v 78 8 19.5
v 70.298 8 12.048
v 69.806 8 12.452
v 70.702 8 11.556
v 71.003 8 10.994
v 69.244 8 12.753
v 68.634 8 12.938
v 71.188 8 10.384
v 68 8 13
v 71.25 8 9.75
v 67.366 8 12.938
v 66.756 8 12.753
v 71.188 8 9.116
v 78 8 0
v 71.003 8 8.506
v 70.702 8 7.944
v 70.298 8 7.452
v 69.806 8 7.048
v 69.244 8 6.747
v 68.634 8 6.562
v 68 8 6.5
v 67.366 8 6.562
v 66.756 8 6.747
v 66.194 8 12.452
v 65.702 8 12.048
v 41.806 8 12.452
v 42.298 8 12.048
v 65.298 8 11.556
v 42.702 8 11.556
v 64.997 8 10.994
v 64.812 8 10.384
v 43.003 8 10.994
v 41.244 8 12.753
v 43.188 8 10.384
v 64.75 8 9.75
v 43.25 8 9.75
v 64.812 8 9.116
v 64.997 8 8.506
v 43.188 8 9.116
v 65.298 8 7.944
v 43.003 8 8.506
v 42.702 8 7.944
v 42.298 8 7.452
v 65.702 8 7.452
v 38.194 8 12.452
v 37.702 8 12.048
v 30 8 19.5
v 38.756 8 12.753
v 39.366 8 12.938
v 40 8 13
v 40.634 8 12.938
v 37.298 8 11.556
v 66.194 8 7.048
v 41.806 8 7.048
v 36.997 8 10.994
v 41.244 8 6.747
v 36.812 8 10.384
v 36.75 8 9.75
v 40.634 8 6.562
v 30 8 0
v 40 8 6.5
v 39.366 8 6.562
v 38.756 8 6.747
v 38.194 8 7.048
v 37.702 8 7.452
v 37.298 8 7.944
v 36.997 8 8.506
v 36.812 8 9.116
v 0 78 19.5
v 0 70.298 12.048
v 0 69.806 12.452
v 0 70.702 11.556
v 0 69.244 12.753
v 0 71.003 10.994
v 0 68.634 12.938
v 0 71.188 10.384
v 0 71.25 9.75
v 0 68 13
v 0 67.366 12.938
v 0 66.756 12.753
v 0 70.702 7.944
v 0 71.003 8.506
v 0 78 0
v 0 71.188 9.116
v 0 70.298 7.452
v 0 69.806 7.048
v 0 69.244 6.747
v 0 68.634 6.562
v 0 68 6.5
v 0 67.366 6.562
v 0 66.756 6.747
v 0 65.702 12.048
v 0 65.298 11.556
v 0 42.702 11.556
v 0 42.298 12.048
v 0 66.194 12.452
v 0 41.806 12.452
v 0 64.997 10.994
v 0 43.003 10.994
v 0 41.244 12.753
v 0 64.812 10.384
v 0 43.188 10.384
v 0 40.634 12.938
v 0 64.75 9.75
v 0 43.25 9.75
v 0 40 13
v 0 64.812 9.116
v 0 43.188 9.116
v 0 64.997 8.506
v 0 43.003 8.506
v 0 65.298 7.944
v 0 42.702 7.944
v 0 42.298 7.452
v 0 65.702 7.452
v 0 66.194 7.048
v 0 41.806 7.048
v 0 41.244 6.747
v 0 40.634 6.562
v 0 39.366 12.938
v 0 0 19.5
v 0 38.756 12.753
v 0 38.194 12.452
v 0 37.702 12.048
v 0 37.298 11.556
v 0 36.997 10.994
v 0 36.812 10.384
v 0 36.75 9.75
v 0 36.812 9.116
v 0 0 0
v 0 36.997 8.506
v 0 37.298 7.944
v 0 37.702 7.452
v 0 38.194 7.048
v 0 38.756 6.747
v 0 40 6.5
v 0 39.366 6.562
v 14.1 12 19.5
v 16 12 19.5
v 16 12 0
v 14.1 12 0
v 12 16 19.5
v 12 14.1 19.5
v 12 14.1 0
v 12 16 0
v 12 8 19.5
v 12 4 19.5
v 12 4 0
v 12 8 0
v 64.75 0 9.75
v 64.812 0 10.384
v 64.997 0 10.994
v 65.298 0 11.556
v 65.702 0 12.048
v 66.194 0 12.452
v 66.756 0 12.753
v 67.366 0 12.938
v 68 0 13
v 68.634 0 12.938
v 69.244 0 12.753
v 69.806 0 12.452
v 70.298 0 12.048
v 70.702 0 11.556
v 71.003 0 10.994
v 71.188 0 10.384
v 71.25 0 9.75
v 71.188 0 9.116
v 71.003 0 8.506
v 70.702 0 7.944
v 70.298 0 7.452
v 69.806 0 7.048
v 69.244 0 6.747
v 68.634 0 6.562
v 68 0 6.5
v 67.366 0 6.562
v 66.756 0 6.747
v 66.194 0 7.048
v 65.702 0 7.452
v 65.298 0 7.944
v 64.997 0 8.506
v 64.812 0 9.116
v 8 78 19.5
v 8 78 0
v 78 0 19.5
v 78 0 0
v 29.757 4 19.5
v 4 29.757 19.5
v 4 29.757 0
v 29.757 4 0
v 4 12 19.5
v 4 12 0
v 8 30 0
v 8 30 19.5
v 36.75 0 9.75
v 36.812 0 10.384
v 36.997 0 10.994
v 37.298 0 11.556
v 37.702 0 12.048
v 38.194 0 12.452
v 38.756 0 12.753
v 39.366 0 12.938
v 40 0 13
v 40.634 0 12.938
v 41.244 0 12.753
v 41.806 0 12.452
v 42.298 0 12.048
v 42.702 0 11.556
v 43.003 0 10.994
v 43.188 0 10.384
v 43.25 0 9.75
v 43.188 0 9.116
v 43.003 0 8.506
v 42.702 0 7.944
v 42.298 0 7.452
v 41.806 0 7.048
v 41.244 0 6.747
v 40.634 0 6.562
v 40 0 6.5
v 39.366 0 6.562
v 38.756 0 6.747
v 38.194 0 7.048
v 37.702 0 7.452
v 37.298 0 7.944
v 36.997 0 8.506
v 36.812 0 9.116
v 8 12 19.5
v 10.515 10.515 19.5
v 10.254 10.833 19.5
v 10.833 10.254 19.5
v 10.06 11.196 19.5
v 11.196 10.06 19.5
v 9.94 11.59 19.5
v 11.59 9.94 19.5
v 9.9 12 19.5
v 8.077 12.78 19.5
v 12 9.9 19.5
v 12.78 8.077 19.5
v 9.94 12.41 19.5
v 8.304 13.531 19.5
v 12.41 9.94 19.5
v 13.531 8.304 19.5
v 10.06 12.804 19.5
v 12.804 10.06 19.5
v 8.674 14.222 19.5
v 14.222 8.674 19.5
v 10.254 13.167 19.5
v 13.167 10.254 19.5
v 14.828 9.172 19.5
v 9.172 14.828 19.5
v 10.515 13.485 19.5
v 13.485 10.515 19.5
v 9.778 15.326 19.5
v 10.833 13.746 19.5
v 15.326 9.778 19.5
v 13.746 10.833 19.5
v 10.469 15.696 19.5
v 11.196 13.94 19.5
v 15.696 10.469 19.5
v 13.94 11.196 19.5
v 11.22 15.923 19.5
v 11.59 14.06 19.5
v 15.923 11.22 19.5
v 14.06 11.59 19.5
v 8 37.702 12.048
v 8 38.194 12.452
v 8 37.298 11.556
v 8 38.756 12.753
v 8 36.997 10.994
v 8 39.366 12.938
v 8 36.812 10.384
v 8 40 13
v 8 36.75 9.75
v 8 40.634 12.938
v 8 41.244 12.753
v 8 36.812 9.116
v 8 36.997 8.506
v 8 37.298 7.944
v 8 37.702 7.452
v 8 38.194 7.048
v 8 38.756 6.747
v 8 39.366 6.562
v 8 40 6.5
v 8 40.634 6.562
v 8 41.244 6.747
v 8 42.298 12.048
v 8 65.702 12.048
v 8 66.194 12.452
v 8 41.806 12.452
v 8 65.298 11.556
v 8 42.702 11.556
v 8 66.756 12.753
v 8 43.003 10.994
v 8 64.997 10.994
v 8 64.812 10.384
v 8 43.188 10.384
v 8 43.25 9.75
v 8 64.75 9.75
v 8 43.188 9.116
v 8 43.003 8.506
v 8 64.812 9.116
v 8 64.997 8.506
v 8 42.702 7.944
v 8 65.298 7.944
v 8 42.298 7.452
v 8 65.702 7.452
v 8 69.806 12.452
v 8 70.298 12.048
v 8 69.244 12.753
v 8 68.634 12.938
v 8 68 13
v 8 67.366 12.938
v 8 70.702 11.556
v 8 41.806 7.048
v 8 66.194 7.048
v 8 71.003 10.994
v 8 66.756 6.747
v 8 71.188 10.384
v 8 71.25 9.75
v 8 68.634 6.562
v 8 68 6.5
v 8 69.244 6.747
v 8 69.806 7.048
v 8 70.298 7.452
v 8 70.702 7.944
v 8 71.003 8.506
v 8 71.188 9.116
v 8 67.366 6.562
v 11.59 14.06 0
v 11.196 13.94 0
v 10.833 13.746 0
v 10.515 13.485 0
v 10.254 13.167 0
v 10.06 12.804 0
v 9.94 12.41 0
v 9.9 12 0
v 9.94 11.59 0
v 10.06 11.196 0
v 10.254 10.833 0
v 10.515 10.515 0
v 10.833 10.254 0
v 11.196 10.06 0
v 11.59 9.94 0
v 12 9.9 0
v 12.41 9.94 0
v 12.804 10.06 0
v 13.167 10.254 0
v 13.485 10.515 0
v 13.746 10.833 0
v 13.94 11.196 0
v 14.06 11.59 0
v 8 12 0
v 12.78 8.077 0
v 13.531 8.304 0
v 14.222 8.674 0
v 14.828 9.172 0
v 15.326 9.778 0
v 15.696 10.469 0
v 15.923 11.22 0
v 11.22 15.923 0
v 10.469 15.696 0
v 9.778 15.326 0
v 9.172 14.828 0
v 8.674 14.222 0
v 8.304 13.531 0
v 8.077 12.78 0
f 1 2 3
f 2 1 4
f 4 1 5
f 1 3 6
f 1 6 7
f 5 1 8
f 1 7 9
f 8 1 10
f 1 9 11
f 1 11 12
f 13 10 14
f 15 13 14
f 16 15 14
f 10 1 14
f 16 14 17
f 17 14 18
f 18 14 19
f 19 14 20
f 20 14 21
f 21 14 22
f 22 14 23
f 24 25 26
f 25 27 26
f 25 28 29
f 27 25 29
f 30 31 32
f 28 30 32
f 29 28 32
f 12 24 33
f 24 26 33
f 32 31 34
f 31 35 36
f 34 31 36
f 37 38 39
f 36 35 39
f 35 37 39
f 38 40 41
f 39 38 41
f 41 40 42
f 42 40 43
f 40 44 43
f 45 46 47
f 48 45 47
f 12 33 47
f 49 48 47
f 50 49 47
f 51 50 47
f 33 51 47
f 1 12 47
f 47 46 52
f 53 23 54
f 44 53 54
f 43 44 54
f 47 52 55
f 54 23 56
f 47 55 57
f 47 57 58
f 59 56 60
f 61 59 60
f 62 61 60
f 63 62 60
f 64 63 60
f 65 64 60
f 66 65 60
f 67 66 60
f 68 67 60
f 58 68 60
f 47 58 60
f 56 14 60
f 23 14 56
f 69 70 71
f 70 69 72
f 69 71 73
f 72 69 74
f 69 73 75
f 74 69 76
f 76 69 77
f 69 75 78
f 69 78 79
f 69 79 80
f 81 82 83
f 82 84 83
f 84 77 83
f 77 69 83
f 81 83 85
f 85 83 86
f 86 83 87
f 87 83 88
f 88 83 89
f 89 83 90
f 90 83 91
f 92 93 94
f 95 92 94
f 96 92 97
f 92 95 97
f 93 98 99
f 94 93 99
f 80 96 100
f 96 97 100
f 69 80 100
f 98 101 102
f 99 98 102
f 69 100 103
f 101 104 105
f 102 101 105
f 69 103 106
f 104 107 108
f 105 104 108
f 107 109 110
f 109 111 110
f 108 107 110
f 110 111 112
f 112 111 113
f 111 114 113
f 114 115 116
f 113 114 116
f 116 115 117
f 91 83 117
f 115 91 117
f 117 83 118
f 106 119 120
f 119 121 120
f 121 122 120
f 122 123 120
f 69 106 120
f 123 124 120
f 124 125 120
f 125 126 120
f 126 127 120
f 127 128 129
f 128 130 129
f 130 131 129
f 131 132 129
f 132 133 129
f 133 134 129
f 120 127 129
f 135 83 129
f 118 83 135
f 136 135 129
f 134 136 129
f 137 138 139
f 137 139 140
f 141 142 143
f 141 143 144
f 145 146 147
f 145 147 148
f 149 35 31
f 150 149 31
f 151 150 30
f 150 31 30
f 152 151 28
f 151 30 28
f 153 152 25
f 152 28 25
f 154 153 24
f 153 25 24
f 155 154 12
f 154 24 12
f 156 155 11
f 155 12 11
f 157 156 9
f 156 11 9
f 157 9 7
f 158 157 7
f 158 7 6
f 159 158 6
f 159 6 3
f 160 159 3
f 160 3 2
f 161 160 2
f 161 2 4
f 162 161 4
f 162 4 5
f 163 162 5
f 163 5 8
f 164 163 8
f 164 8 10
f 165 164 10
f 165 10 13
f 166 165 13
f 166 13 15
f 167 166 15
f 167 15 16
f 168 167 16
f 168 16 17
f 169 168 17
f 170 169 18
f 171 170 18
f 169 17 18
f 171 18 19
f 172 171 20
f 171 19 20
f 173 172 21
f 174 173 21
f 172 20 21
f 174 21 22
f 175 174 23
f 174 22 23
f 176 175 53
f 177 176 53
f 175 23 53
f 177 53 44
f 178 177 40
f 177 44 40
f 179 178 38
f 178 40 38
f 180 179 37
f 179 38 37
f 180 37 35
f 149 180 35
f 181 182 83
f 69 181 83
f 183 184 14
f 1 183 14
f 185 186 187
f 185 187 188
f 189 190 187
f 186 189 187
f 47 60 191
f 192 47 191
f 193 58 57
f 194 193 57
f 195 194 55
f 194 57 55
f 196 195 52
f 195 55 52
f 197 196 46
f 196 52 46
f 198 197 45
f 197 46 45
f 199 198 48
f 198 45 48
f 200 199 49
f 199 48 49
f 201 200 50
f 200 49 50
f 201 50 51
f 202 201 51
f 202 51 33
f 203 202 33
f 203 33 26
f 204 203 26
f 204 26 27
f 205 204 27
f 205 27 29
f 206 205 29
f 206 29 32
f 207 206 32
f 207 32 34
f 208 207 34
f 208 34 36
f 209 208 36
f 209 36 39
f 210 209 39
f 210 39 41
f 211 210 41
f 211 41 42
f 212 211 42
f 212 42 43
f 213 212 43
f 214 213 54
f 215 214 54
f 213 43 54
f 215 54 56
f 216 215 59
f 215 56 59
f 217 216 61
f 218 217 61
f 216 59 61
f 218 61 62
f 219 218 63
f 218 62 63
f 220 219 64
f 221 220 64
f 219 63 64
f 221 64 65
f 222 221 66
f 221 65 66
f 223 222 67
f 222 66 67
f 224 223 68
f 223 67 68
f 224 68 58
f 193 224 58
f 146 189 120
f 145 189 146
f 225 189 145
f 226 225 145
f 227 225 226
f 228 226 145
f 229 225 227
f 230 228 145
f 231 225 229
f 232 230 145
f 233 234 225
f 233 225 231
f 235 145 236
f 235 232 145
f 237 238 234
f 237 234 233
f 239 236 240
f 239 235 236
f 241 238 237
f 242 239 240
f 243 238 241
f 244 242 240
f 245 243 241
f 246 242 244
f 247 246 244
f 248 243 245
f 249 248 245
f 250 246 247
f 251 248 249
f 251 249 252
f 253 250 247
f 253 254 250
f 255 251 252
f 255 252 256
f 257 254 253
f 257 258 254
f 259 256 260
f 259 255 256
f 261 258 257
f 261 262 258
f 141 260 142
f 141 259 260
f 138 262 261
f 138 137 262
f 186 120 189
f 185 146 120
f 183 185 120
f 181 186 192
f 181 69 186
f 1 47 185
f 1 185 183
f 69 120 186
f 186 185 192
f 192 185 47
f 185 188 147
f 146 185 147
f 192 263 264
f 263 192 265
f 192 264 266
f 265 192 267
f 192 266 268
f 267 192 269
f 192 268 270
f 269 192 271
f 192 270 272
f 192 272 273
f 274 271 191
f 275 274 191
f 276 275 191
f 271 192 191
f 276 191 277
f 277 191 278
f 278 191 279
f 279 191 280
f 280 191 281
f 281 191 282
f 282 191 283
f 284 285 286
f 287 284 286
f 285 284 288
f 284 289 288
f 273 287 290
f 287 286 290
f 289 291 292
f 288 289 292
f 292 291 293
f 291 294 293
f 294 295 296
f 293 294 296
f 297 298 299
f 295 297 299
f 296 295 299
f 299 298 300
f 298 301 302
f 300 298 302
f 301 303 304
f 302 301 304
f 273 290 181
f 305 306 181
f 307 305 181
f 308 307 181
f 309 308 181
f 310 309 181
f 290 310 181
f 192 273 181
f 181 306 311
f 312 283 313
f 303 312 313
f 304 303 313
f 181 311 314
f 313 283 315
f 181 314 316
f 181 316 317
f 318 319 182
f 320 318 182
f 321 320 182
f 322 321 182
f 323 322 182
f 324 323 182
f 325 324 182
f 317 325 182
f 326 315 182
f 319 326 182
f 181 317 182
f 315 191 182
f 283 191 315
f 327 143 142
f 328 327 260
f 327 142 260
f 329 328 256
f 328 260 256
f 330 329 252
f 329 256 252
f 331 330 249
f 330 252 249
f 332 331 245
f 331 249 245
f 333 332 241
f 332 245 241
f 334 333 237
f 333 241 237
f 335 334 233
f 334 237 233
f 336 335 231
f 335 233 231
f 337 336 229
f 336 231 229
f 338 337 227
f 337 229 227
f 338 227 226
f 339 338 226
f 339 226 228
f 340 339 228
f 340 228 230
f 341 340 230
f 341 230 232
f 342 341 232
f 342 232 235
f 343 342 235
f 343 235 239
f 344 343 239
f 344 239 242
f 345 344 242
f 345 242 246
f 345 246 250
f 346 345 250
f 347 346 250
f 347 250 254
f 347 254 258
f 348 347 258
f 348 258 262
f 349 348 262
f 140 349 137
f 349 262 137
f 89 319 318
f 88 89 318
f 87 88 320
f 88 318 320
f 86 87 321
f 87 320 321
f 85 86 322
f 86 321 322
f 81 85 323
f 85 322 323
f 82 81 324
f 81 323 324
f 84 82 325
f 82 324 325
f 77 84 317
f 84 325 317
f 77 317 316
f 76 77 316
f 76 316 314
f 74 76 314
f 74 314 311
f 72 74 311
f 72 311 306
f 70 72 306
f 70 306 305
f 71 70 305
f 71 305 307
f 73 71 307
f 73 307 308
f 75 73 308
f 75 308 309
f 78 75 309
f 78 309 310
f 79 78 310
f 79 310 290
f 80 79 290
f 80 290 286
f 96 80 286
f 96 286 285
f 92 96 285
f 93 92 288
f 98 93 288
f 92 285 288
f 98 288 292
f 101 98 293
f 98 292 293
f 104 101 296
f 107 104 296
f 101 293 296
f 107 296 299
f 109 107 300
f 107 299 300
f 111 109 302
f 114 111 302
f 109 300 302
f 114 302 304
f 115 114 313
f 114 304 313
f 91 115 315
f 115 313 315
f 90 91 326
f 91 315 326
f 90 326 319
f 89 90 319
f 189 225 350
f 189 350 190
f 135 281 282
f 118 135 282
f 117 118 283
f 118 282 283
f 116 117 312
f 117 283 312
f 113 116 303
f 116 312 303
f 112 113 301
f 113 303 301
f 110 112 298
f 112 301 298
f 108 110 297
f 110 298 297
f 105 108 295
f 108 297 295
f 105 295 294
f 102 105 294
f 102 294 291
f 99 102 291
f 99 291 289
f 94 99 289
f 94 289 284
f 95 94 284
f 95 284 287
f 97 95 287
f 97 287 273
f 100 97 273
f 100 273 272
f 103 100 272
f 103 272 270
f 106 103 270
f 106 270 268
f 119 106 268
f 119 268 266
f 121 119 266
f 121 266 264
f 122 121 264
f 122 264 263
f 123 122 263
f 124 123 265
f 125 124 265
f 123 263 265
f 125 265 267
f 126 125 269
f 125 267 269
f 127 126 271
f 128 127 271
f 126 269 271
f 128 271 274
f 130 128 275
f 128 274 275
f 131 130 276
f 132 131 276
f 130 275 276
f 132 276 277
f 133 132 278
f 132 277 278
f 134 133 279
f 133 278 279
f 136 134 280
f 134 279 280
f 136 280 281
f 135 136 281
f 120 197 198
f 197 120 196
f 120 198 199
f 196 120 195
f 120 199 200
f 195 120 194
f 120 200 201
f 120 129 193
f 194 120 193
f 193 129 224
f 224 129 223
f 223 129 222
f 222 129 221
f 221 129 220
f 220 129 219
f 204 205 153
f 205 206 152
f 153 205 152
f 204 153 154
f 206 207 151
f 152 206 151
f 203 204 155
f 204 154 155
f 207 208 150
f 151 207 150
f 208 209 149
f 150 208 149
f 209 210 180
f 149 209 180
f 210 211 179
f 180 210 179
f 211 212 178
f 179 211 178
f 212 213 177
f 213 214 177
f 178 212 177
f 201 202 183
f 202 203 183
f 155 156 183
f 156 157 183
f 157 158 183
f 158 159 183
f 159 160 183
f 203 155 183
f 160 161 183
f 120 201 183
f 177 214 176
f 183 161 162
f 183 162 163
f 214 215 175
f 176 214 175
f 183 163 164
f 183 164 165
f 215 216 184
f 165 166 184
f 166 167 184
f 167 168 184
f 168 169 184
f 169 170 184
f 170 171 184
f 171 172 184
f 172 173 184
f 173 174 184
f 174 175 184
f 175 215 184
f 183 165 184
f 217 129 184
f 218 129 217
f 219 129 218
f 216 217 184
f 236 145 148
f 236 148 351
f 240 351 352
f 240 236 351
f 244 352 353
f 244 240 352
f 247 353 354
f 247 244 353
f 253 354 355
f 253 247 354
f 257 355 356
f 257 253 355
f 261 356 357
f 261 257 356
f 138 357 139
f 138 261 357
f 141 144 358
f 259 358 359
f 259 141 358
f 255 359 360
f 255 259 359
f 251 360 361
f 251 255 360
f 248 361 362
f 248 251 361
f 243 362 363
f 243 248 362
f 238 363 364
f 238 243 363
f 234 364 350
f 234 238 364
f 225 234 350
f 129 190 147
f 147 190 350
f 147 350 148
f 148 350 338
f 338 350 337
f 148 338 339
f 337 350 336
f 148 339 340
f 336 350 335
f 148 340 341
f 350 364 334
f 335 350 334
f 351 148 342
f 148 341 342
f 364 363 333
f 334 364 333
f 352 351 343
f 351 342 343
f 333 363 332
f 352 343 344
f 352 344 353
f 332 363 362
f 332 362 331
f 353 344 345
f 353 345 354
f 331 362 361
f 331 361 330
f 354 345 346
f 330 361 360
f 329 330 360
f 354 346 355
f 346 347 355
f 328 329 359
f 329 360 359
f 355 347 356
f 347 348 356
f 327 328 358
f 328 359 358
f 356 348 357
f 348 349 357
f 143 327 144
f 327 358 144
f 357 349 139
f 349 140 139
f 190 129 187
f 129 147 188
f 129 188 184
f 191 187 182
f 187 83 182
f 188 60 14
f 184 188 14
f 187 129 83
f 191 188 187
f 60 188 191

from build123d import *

# Parameters (mm, degrees)
EXTRUDE_1_DEPTH     = 19.5
CUT_EXTRUDE_1_REACH = 114.019
EXTRUDE_2_DEPTH     = 19.5
CUT_EXTRUDE_2_REACH = 114.019
SKETCH_4_R          = 2.1
CUT_EXTRUDE_3_REACH = 108.603
SKETCH_5_R          = 3.25
CUT_EXTRUDE_4_REACH = 108.603
SKETCH_6_R          = 3.25


with BuildPart() as part:
    # 草图1 → 凸台-拉伸1 (new body)
    with BuildSketch(Plane.XY):
        Polygon((0, 0), (78, 0), (78, 8), (30, 8), (8, 30), (8, 78), (0, 78), align=None)
    extrude(amount=EXTRUDE_1_DEPTH)

    # 草图2 → 切除-拉伸1 (cut, up to next)
    with BuildSketch(Plane.XY.offset(19.5), mode=Mode.PRIVATE) as cut_extrude_1_sk1:
        Polygon((4, 29.757359313), (29.757359313, 4), (12, 4), (12, 12), (4, 12), align=None)
    cut_extrude_1_tool1 = extrude(cut_extrude_1_sk1.sketch, amount=-CUT_EXTRUDE_1_REACH, mode=Mode.PRIVATE) & part.part
    add(cut_extrude_1_tool1.solids().sort_by_distance((13.682042, 13.682042, 19.5))[0], mode=Mode.SUBTRACT)

    # 草图3 → 凸台-拉伸2 (add)
    with BuildSketch(Plane.XY.offset(19.5)):
        with BuildLine():
            Line((12, 12), (12, 16))
            ThreePointArc((12, 16), (9.171572875, 9.171572875), (16, 12))
            Line((16, 12), (12, 12))
        make_face()
    extrude(amount=-EXTRUDE_2_DEPTH)

    # 草图4 → 切除-拉伸2 (cut, up to next)
    with BuildSketch(Plane.XY.offset(19.5), mode=Mode.PRIVATE) as cut_extrude_2_sk1:
        with Locations((12, 12)):
            Circle(SKETCH_4_R)
    cut_extrude_2_tool1 = extrude(cut_extrude_2_sk1.sketch, amount=-CUT_EXTRUDE_2_REACH, mode=Mode.PRIVATE) & part.part
    add(cut_extrude_2_tool1.solids().sort_by_distance((12, 12, 19.5))[0], mode=Mode.SUBTRACT)

    # 草图5 → 切除-拉伸3 (cut, up to next)
    with BuildSketch(Plane(origin=(0, 8, 0), x_dir=(1, 0, 0), z_dir=(0, 1, 0)), mode=Mode.PRIVATE) as cut_extrude_3_sk1:
        with Locations(Location((40, -9.75, 0), (0, 0, 180))):
            Circle(SKETCH_5_R)
    cut_extrude_3_tool1 = extrude(cut_extrude_3_sk1.sketch, amount=-CUT_EXTRUDE_3_REACH, mode=Mode.PRIVATE) & part.part
    # 草图5 → 切除-拉伸3 (cut, up to next)
    with BuildSketch(Plane(origin=(0, 8, 0), x_dir=(1, 0, 0), z_dir=(0, 1, 0)), mode=Mode.PRIVATE) as cut_extrude_3_sk2:
        with Locations(Location((68, -9.75, 0), (0, 0, 180))):
            Circle(SKETCH_5_R)
    cut_extrude_3_tool2 = extrude(cut_extrude_3_sk2.sketch, amount=-CUT_EXTRUDE_3_REACH, mode=Mode.PRIVATE) & part.part
    add(cut_extrude_3_tool1.solids().sort_by_distance((40, 8, 9.75))[0], mode=Mode.SUBTRACT)
    add(cut_extrude_3_tool2.solids().sort_by_distance((68, 8, 9.75))[0], mode=Mode.SUBTRACT)

    # 草图6 → 切除-拉伸4 (cut, up to next)
    with BuildSketch(Plane(origin=(8, 0, 0), x_dir=(0, 0, -1), z_dir=(1, 0, 0)), mode=Mode.PRIVATE) as cut_extrude_4_sk1:
        with Locations((-9.75, 68)):
            Circle(SKETCH_6_R)
    cut_extrude_4_tool1 = extrude(cut_extrude_4_sk1.sketch, amount=-CUT_EXTRUDE_4_REACH, mode=Mode.PRIVATE) & part.part
    # 草图6 → 切除-拉伸4 (cut, up to next)
    with BuildSketch(Plane(origin=(8, 0, 0), x_dir=(0, 0, -1), z_dir=(1, 0, 0)), mode=Mode.PRIVATE) as cut_extrude_4_sk2:
        with Locations((-9.75, 40)):
            Circle(SKETCH_6_R)
    cut_extrude_4_tool2 = extrude(cut_extrude_4_sk2.sketch, amount=-CUT_EXTRUDE_4_REACH, mode=Mode.PRIVATE) & part.part
    add(cut_extrude_4_tool1.solids().sort_by_distance((8, 68, 9.75))[0], mode=Mode.SUBTRACT)
    add(cut_extrude_4_tool2.solids().sort_by_distance((8, 40, 9.75))[0], mode=Mode.SUBTRACT)


solid = part.part
